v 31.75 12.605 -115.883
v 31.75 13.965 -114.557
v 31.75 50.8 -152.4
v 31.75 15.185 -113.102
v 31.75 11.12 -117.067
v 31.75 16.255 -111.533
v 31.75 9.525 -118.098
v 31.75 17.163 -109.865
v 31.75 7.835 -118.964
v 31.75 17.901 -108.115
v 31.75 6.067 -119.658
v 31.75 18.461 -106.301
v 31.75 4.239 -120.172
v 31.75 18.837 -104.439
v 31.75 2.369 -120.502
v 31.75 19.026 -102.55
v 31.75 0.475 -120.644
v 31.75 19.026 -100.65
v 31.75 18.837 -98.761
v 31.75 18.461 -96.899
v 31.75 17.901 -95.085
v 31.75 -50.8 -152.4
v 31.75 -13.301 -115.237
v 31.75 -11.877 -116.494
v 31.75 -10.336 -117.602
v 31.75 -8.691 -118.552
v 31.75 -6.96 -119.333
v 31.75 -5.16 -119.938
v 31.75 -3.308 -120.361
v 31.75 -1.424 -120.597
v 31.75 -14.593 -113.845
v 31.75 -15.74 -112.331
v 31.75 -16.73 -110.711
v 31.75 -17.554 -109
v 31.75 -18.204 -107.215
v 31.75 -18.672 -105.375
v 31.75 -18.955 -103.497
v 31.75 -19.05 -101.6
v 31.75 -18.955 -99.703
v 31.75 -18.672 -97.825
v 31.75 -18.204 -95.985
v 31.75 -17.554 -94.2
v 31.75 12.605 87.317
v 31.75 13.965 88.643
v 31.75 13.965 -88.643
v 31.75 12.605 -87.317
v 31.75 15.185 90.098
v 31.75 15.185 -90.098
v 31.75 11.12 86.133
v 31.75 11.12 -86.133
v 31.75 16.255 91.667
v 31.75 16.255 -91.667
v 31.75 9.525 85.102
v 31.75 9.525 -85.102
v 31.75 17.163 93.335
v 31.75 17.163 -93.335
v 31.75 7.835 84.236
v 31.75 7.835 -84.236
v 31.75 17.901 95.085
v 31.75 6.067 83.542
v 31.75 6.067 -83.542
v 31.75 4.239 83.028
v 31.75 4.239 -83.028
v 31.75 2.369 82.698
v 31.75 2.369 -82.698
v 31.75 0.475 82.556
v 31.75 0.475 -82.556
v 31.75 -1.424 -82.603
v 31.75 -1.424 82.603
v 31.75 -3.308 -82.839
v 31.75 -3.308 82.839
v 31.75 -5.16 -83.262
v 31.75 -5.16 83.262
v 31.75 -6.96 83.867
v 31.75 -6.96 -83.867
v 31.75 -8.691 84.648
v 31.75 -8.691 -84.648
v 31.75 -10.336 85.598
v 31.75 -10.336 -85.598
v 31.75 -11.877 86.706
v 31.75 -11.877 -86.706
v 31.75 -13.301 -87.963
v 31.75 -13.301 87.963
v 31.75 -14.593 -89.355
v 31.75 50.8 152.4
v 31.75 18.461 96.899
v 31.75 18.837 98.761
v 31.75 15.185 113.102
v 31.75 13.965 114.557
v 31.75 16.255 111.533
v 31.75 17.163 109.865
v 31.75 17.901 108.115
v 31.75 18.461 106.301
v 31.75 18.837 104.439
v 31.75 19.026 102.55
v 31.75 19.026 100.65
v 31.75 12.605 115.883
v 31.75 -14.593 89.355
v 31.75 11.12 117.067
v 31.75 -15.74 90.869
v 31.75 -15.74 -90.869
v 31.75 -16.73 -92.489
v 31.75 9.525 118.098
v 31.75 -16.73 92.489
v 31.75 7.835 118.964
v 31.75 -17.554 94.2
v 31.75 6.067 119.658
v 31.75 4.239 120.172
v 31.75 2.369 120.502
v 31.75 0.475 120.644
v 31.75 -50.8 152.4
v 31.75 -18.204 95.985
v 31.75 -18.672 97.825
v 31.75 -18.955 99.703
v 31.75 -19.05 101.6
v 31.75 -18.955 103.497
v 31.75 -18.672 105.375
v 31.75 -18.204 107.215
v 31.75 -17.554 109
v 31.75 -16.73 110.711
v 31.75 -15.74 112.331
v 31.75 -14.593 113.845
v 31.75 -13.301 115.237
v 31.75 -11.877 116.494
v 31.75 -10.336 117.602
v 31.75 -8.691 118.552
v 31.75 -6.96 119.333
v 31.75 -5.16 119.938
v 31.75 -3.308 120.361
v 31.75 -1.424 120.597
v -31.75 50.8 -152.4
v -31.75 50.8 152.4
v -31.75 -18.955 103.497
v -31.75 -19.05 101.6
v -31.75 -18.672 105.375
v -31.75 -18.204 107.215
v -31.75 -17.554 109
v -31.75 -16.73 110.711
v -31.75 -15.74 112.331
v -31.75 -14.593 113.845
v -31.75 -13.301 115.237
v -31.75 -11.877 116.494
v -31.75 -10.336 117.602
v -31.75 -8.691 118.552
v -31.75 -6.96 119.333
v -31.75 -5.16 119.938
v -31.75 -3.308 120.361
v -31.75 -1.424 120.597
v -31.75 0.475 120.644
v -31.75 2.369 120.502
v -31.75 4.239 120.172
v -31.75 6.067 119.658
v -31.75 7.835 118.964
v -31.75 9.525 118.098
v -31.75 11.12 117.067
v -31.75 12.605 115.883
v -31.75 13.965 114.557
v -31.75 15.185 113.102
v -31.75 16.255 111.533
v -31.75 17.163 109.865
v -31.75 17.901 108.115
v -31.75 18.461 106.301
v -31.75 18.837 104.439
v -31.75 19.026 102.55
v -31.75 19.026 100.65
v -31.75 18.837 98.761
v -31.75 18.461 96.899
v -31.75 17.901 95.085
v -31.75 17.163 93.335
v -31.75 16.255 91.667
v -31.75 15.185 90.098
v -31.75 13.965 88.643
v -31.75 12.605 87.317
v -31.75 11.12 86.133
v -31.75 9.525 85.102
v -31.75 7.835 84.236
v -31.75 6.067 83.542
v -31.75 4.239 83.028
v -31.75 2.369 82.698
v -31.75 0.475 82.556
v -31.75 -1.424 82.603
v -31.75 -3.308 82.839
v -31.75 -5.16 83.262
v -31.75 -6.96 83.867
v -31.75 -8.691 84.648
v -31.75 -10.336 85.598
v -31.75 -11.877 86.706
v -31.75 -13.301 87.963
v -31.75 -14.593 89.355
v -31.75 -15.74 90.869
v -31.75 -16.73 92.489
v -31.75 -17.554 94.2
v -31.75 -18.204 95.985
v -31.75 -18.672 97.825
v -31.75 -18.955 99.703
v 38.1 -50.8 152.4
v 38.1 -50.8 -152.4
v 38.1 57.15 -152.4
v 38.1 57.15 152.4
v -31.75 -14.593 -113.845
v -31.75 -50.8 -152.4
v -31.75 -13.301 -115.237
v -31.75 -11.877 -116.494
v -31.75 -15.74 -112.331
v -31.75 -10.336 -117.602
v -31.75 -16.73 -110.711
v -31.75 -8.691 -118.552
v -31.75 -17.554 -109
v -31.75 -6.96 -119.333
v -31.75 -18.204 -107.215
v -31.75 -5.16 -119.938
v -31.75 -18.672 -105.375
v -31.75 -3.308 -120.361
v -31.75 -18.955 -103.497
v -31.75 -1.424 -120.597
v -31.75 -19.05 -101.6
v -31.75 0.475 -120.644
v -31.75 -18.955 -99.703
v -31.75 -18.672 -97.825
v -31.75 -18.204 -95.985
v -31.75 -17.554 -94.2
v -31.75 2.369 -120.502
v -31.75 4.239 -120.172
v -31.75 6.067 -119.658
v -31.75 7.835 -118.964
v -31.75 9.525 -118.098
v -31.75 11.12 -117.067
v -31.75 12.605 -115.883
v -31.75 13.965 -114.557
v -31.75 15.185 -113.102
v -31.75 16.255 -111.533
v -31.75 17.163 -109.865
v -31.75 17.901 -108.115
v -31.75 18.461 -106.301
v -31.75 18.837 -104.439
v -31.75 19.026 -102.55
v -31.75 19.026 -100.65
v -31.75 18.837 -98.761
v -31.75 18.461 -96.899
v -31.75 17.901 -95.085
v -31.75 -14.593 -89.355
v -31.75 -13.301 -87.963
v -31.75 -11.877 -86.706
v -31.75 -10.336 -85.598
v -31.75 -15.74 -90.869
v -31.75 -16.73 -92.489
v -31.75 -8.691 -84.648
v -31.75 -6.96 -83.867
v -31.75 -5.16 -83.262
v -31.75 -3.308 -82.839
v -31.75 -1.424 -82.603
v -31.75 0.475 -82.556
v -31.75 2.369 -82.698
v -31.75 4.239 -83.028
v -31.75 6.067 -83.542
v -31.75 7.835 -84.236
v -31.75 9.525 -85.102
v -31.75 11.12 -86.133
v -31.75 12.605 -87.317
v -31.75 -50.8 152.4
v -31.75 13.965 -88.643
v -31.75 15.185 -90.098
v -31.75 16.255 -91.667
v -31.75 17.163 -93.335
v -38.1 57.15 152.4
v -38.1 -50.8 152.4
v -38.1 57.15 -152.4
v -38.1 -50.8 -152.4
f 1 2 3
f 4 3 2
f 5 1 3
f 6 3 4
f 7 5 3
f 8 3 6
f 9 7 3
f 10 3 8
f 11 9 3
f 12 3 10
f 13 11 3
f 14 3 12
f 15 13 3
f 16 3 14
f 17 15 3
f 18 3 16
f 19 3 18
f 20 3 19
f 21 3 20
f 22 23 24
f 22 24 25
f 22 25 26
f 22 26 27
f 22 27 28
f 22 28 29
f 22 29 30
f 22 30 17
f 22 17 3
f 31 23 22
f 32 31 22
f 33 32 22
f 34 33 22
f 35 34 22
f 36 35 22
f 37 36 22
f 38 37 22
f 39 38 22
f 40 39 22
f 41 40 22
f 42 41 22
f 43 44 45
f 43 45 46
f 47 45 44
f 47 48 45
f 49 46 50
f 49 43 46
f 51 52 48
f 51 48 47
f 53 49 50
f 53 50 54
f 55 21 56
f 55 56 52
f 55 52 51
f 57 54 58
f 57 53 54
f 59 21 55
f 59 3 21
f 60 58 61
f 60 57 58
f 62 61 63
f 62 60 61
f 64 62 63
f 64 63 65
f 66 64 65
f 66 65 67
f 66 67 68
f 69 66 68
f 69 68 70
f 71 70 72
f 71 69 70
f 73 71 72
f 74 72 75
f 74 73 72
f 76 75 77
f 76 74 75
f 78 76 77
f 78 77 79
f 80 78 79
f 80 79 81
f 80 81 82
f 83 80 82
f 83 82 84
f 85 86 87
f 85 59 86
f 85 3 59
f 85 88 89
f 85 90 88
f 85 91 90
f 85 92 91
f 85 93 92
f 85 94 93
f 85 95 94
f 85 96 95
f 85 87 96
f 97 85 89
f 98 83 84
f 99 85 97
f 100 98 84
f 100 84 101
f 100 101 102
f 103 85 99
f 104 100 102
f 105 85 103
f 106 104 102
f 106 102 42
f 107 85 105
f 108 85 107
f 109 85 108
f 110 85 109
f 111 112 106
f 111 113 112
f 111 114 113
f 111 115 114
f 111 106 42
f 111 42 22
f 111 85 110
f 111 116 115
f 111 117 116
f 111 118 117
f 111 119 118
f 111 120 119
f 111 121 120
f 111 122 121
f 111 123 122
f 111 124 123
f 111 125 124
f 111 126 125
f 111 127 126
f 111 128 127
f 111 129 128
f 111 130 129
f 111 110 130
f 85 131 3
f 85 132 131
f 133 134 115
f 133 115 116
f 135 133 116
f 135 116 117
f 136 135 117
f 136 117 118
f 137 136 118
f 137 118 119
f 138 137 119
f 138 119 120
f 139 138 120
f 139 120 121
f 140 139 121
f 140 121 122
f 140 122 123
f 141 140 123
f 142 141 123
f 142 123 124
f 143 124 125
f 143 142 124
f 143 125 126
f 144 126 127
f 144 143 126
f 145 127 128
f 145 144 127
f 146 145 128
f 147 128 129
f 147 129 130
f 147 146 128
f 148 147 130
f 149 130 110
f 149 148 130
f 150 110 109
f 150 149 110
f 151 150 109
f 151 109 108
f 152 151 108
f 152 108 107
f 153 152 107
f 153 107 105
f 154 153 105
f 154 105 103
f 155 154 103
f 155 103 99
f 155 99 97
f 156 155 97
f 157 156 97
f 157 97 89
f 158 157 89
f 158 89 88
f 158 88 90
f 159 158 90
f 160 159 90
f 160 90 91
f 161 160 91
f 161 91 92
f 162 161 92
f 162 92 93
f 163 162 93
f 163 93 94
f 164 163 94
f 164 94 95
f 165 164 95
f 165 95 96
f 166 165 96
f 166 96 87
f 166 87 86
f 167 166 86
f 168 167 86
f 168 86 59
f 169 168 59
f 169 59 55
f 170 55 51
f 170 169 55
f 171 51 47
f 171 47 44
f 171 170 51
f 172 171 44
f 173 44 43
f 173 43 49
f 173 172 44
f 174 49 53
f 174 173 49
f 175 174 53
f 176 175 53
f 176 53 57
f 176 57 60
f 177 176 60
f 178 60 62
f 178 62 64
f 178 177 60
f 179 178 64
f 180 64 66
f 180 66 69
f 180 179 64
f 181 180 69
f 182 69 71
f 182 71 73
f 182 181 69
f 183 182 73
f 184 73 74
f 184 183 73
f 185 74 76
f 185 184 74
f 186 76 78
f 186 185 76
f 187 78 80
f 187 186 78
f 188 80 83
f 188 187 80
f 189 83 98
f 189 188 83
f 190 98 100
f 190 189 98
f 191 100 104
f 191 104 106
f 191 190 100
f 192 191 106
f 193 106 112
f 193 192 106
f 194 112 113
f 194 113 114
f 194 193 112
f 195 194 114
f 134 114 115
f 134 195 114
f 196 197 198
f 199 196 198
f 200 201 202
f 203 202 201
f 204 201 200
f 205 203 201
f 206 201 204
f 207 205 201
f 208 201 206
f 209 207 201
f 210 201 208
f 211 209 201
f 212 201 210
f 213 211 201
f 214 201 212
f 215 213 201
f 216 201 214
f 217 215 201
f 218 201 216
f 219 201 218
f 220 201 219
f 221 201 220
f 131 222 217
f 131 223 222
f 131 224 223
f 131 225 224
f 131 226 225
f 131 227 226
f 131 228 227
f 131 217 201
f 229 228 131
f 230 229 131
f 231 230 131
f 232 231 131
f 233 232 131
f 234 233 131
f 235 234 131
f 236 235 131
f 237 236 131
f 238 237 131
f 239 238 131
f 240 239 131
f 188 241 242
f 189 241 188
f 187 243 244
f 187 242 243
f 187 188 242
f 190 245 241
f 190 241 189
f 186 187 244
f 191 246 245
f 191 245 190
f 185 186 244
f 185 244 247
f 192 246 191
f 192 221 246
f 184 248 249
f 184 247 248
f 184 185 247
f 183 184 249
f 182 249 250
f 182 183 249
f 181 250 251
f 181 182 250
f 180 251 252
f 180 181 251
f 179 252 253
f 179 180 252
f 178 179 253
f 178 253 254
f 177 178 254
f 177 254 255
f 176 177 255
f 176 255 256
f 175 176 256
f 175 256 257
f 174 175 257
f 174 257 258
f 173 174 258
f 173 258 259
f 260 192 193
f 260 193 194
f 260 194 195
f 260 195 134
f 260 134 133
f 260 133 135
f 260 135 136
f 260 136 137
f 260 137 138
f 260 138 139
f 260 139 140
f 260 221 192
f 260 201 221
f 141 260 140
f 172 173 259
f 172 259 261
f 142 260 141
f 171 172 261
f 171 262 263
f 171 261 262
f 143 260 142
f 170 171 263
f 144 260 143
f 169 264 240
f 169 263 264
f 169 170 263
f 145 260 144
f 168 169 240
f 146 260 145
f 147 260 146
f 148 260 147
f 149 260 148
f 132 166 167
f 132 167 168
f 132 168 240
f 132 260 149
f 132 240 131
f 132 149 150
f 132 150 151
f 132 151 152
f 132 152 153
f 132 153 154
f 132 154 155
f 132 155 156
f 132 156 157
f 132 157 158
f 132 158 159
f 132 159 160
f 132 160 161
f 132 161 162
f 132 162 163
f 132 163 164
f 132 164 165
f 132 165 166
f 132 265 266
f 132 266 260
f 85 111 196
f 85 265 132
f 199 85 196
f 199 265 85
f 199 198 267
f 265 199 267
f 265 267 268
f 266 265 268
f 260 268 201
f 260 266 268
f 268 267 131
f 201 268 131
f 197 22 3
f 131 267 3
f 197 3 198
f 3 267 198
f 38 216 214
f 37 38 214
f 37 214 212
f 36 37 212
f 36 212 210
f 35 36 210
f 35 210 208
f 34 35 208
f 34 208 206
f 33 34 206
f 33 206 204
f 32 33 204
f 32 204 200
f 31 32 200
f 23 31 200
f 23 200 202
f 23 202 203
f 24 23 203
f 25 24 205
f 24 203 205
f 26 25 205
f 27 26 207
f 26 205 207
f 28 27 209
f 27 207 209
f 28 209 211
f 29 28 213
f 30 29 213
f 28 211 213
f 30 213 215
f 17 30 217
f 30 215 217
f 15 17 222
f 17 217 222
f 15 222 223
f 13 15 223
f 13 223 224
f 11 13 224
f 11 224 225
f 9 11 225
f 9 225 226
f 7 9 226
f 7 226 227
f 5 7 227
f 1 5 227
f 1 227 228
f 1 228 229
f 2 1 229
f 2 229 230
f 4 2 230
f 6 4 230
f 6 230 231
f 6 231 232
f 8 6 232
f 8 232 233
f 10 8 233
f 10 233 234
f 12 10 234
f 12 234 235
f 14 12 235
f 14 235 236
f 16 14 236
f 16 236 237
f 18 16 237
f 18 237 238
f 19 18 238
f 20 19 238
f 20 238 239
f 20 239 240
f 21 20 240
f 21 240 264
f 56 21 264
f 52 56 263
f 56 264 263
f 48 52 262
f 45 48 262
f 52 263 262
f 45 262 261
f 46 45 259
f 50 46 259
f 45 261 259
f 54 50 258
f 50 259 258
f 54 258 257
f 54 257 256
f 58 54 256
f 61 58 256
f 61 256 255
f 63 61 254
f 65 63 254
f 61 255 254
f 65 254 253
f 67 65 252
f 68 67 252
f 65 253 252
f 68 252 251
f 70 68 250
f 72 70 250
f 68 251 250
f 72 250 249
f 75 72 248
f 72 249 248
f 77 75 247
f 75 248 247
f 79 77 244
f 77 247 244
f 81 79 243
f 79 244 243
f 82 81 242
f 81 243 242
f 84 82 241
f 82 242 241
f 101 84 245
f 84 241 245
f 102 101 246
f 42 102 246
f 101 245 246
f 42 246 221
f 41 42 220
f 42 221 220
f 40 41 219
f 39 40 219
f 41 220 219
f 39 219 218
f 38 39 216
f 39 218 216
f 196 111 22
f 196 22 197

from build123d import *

# Parameters (mm, degrees)
F1_DEPTH      = 152.4
F1_DEPTH_BACK = 152.4
F2_R          = 19.05
F3_DEPTH      = 76.2


with BuildPart() as f1:
    # F0 (on Top) → F1 (new body, two sides)
    with BuildSketch(Plane.XY) as f1_sk:
        Polygon((-31.75, 50.8), (31.75, 50.8), (31.75, -50.8), (38.1, -50.8), (38.1, 57.15), (-38.1, 57.15), (-38.1, -50.8), (-31.75, -50.8), align=None)
    extrude(amount=F1_DEPTH)
    extrude(f1_sk.sketch, amount=-F1_DEPTH_BACK)

    # F2 (on face) → F3 (join)
    with BuildSketch(Plane(origin=(-38.1, 0, 0), x_dir=(0, -1, 0), z_dir=(-1, 0, 0))):
        with Locations((0, 101.6)):
            Circle(F2_R)
    extrude(amount=-F3_DEPTH)

    # F4: F1 across plane


with BuildPart() as f1_1:
    add(f1.part)
    add(f1.part.mirror(Plane.XY))


solid = f1_1.part
